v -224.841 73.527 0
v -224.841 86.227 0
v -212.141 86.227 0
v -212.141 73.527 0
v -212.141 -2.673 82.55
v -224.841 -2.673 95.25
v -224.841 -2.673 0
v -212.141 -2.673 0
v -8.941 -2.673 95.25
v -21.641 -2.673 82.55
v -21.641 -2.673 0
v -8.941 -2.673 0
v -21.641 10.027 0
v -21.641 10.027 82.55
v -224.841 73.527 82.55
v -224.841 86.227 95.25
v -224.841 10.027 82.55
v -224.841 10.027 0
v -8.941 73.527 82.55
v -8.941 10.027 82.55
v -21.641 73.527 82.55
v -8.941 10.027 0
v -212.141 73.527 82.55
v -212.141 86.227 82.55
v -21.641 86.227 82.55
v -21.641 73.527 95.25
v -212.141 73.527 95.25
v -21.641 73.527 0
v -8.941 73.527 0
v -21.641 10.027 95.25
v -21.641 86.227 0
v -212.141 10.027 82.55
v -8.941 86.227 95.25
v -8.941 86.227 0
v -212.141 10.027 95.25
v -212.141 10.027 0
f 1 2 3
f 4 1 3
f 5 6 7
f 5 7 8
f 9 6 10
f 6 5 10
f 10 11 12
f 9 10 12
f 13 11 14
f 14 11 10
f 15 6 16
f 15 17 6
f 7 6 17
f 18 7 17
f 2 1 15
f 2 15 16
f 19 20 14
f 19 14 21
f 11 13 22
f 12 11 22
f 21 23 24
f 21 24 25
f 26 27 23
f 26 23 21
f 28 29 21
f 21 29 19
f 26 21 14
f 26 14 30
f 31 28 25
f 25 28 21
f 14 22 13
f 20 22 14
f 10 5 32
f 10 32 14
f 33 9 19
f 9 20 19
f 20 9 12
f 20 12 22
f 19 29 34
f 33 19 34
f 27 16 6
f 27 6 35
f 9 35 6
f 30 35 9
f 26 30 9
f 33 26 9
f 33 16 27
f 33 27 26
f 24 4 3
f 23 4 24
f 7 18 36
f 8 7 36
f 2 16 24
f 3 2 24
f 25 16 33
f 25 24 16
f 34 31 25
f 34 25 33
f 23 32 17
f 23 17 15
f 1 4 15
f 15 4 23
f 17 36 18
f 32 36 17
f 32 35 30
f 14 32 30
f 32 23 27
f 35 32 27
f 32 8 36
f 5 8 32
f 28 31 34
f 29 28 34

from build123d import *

# Parameters (mm, degrees)
F0_W     = 215.9
F0_H     = 88.9
F1_DEPTH = 95.25
F2_W     = 190.5
F2_H     = 63.5
F3_DEPTH = 95.251
F4_W     = 190.5
F4_H     = 82.55
F5_DEPTH = 88.901
F6_W     = 63.5
F6_H     = 82.55
F7_DEPTH = 215.901


with BuildPart() as f1:
    # F0 (on Top) → F1 (new body)
    with BuildSketch(Plane.XY):
        with Locations((-116.891209875, 41.7768546164)):
            Rectangle(F0_W, F0_H)
    extrude(amount=F1_DEPTH)

    # F2 (on face) → F3 (cut, through all)
    with BuildSketch(Plane.XY.offset(95.25)):
        with Locations((-116.891209875, 41.7768546164)):
            Rectangle(F2_W, F2_H)
    extrude(amount=-F3_DEPTH, mode=Mode.SUBTRACT)

    # F4 (on face) → F5 (cut, through all)
    with BuildSketch(Plane.XZ.offset(2.6731453836)):
        with Locations((-116.891209875, 41.275)):
            Rectangle(F4_W, F4_H)
    extrude(amount=-F5_DEPTH, mode=Mode.SUBTRACT)

    # F6 (on face) → F7 (cut, through all)
    with BuildSketch(Plane.YZ.offset(-8.941209875)):
        with Locations((41.7768546164, 41.275)):
            Rectangle(F6_W, F6_H)
    extrude(amount=-F7_DEPTH, mode=Mode.SUBTRACT)


solid = f1.part
